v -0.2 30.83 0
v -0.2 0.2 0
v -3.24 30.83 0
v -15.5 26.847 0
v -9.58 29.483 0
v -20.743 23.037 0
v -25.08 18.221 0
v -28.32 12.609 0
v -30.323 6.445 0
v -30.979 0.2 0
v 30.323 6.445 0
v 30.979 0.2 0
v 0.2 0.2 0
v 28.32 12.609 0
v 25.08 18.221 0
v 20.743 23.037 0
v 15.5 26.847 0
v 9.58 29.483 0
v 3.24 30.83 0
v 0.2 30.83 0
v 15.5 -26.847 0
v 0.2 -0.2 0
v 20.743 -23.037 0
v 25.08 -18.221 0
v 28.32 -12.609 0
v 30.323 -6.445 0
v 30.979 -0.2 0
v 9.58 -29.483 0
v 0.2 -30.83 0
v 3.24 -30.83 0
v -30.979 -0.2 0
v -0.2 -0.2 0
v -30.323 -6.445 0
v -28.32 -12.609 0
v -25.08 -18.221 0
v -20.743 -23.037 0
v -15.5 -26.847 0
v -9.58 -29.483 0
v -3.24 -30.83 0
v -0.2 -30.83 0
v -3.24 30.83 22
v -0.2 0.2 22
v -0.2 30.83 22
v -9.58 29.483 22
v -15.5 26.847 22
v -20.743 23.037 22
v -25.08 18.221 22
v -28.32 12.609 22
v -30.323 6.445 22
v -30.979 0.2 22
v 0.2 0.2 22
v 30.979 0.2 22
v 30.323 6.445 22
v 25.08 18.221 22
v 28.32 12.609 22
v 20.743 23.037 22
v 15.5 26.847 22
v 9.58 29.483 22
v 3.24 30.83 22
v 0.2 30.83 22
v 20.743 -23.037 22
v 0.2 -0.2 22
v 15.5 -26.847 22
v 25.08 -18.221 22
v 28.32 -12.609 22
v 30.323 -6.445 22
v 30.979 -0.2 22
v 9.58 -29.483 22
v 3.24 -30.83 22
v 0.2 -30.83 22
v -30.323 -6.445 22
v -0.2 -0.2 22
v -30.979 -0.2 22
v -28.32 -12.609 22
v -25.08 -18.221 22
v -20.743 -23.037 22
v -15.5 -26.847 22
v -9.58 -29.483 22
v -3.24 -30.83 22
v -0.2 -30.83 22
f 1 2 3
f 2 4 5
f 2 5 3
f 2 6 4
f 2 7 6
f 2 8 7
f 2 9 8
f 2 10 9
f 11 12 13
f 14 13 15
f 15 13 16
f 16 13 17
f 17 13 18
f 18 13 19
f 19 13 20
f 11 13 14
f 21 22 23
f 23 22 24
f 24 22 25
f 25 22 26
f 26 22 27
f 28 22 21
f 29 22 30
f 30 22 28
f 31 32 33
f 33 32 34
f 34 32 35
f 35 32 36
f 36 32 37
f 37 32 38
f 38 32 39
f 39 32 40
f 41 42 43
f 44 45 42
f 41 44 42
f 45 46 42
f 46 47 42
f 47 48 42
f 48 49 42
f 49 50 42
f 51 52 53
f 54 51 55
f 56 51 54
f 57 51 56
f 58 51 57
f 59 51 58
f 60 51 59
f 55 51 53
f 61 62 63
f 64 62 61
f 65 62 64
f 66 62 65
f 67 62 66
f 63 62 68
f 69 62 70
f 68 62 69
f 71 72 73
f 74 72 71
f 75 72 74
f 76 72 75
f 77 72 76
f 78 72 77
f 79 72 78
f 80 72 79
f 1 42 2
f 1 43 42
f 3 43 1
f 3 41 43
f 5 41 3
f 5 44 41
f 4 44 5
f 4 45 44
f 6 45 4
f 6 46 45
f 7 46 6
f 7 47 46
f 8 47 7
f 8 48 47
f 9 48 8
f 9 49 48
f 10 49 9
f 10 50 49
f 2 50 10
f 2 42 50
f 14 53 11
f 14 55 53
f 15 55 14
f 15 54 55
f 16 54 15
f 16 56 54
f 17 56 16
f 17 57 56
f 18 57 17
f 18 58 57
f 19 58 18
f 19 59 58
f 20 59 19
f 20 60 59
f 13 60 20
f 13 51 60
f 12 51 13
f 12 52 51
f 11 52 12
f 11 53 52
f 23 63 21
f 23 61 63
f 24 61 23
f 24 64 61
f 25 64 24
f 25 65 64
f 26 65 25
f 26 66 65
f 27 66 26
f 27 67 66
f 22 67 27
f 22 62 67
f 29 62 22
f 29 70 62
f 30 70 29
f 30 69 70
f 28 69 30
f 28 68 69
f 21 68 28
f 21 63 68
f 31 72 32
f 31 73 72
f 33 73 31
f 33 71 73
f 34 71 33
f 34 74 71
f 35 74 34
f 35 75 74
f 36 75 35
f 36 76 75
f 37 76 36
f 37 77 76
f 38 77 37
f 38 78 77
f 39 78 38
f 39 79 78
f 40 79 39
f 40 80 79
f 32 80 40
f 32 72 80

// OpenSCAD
//Konfiguration
//Radius
    r = 31;
//Höhe des Kuchens
    h = 22;
//Anzahl der Stücke (gerade Zahl)
    n = 4;
    
module Schnitt (b = 0.4, l = 2*r+2)
    translate([0, 0, 0])
    for (i = [0:n-1]) {
        rotate(i*360/n)
        square([b, l], true);
    }

module Kuchen ()
    linear_extrude(height = h)
    difference(){
        circle(r, true);
        Schnitt();   
}

Kuchen ();
